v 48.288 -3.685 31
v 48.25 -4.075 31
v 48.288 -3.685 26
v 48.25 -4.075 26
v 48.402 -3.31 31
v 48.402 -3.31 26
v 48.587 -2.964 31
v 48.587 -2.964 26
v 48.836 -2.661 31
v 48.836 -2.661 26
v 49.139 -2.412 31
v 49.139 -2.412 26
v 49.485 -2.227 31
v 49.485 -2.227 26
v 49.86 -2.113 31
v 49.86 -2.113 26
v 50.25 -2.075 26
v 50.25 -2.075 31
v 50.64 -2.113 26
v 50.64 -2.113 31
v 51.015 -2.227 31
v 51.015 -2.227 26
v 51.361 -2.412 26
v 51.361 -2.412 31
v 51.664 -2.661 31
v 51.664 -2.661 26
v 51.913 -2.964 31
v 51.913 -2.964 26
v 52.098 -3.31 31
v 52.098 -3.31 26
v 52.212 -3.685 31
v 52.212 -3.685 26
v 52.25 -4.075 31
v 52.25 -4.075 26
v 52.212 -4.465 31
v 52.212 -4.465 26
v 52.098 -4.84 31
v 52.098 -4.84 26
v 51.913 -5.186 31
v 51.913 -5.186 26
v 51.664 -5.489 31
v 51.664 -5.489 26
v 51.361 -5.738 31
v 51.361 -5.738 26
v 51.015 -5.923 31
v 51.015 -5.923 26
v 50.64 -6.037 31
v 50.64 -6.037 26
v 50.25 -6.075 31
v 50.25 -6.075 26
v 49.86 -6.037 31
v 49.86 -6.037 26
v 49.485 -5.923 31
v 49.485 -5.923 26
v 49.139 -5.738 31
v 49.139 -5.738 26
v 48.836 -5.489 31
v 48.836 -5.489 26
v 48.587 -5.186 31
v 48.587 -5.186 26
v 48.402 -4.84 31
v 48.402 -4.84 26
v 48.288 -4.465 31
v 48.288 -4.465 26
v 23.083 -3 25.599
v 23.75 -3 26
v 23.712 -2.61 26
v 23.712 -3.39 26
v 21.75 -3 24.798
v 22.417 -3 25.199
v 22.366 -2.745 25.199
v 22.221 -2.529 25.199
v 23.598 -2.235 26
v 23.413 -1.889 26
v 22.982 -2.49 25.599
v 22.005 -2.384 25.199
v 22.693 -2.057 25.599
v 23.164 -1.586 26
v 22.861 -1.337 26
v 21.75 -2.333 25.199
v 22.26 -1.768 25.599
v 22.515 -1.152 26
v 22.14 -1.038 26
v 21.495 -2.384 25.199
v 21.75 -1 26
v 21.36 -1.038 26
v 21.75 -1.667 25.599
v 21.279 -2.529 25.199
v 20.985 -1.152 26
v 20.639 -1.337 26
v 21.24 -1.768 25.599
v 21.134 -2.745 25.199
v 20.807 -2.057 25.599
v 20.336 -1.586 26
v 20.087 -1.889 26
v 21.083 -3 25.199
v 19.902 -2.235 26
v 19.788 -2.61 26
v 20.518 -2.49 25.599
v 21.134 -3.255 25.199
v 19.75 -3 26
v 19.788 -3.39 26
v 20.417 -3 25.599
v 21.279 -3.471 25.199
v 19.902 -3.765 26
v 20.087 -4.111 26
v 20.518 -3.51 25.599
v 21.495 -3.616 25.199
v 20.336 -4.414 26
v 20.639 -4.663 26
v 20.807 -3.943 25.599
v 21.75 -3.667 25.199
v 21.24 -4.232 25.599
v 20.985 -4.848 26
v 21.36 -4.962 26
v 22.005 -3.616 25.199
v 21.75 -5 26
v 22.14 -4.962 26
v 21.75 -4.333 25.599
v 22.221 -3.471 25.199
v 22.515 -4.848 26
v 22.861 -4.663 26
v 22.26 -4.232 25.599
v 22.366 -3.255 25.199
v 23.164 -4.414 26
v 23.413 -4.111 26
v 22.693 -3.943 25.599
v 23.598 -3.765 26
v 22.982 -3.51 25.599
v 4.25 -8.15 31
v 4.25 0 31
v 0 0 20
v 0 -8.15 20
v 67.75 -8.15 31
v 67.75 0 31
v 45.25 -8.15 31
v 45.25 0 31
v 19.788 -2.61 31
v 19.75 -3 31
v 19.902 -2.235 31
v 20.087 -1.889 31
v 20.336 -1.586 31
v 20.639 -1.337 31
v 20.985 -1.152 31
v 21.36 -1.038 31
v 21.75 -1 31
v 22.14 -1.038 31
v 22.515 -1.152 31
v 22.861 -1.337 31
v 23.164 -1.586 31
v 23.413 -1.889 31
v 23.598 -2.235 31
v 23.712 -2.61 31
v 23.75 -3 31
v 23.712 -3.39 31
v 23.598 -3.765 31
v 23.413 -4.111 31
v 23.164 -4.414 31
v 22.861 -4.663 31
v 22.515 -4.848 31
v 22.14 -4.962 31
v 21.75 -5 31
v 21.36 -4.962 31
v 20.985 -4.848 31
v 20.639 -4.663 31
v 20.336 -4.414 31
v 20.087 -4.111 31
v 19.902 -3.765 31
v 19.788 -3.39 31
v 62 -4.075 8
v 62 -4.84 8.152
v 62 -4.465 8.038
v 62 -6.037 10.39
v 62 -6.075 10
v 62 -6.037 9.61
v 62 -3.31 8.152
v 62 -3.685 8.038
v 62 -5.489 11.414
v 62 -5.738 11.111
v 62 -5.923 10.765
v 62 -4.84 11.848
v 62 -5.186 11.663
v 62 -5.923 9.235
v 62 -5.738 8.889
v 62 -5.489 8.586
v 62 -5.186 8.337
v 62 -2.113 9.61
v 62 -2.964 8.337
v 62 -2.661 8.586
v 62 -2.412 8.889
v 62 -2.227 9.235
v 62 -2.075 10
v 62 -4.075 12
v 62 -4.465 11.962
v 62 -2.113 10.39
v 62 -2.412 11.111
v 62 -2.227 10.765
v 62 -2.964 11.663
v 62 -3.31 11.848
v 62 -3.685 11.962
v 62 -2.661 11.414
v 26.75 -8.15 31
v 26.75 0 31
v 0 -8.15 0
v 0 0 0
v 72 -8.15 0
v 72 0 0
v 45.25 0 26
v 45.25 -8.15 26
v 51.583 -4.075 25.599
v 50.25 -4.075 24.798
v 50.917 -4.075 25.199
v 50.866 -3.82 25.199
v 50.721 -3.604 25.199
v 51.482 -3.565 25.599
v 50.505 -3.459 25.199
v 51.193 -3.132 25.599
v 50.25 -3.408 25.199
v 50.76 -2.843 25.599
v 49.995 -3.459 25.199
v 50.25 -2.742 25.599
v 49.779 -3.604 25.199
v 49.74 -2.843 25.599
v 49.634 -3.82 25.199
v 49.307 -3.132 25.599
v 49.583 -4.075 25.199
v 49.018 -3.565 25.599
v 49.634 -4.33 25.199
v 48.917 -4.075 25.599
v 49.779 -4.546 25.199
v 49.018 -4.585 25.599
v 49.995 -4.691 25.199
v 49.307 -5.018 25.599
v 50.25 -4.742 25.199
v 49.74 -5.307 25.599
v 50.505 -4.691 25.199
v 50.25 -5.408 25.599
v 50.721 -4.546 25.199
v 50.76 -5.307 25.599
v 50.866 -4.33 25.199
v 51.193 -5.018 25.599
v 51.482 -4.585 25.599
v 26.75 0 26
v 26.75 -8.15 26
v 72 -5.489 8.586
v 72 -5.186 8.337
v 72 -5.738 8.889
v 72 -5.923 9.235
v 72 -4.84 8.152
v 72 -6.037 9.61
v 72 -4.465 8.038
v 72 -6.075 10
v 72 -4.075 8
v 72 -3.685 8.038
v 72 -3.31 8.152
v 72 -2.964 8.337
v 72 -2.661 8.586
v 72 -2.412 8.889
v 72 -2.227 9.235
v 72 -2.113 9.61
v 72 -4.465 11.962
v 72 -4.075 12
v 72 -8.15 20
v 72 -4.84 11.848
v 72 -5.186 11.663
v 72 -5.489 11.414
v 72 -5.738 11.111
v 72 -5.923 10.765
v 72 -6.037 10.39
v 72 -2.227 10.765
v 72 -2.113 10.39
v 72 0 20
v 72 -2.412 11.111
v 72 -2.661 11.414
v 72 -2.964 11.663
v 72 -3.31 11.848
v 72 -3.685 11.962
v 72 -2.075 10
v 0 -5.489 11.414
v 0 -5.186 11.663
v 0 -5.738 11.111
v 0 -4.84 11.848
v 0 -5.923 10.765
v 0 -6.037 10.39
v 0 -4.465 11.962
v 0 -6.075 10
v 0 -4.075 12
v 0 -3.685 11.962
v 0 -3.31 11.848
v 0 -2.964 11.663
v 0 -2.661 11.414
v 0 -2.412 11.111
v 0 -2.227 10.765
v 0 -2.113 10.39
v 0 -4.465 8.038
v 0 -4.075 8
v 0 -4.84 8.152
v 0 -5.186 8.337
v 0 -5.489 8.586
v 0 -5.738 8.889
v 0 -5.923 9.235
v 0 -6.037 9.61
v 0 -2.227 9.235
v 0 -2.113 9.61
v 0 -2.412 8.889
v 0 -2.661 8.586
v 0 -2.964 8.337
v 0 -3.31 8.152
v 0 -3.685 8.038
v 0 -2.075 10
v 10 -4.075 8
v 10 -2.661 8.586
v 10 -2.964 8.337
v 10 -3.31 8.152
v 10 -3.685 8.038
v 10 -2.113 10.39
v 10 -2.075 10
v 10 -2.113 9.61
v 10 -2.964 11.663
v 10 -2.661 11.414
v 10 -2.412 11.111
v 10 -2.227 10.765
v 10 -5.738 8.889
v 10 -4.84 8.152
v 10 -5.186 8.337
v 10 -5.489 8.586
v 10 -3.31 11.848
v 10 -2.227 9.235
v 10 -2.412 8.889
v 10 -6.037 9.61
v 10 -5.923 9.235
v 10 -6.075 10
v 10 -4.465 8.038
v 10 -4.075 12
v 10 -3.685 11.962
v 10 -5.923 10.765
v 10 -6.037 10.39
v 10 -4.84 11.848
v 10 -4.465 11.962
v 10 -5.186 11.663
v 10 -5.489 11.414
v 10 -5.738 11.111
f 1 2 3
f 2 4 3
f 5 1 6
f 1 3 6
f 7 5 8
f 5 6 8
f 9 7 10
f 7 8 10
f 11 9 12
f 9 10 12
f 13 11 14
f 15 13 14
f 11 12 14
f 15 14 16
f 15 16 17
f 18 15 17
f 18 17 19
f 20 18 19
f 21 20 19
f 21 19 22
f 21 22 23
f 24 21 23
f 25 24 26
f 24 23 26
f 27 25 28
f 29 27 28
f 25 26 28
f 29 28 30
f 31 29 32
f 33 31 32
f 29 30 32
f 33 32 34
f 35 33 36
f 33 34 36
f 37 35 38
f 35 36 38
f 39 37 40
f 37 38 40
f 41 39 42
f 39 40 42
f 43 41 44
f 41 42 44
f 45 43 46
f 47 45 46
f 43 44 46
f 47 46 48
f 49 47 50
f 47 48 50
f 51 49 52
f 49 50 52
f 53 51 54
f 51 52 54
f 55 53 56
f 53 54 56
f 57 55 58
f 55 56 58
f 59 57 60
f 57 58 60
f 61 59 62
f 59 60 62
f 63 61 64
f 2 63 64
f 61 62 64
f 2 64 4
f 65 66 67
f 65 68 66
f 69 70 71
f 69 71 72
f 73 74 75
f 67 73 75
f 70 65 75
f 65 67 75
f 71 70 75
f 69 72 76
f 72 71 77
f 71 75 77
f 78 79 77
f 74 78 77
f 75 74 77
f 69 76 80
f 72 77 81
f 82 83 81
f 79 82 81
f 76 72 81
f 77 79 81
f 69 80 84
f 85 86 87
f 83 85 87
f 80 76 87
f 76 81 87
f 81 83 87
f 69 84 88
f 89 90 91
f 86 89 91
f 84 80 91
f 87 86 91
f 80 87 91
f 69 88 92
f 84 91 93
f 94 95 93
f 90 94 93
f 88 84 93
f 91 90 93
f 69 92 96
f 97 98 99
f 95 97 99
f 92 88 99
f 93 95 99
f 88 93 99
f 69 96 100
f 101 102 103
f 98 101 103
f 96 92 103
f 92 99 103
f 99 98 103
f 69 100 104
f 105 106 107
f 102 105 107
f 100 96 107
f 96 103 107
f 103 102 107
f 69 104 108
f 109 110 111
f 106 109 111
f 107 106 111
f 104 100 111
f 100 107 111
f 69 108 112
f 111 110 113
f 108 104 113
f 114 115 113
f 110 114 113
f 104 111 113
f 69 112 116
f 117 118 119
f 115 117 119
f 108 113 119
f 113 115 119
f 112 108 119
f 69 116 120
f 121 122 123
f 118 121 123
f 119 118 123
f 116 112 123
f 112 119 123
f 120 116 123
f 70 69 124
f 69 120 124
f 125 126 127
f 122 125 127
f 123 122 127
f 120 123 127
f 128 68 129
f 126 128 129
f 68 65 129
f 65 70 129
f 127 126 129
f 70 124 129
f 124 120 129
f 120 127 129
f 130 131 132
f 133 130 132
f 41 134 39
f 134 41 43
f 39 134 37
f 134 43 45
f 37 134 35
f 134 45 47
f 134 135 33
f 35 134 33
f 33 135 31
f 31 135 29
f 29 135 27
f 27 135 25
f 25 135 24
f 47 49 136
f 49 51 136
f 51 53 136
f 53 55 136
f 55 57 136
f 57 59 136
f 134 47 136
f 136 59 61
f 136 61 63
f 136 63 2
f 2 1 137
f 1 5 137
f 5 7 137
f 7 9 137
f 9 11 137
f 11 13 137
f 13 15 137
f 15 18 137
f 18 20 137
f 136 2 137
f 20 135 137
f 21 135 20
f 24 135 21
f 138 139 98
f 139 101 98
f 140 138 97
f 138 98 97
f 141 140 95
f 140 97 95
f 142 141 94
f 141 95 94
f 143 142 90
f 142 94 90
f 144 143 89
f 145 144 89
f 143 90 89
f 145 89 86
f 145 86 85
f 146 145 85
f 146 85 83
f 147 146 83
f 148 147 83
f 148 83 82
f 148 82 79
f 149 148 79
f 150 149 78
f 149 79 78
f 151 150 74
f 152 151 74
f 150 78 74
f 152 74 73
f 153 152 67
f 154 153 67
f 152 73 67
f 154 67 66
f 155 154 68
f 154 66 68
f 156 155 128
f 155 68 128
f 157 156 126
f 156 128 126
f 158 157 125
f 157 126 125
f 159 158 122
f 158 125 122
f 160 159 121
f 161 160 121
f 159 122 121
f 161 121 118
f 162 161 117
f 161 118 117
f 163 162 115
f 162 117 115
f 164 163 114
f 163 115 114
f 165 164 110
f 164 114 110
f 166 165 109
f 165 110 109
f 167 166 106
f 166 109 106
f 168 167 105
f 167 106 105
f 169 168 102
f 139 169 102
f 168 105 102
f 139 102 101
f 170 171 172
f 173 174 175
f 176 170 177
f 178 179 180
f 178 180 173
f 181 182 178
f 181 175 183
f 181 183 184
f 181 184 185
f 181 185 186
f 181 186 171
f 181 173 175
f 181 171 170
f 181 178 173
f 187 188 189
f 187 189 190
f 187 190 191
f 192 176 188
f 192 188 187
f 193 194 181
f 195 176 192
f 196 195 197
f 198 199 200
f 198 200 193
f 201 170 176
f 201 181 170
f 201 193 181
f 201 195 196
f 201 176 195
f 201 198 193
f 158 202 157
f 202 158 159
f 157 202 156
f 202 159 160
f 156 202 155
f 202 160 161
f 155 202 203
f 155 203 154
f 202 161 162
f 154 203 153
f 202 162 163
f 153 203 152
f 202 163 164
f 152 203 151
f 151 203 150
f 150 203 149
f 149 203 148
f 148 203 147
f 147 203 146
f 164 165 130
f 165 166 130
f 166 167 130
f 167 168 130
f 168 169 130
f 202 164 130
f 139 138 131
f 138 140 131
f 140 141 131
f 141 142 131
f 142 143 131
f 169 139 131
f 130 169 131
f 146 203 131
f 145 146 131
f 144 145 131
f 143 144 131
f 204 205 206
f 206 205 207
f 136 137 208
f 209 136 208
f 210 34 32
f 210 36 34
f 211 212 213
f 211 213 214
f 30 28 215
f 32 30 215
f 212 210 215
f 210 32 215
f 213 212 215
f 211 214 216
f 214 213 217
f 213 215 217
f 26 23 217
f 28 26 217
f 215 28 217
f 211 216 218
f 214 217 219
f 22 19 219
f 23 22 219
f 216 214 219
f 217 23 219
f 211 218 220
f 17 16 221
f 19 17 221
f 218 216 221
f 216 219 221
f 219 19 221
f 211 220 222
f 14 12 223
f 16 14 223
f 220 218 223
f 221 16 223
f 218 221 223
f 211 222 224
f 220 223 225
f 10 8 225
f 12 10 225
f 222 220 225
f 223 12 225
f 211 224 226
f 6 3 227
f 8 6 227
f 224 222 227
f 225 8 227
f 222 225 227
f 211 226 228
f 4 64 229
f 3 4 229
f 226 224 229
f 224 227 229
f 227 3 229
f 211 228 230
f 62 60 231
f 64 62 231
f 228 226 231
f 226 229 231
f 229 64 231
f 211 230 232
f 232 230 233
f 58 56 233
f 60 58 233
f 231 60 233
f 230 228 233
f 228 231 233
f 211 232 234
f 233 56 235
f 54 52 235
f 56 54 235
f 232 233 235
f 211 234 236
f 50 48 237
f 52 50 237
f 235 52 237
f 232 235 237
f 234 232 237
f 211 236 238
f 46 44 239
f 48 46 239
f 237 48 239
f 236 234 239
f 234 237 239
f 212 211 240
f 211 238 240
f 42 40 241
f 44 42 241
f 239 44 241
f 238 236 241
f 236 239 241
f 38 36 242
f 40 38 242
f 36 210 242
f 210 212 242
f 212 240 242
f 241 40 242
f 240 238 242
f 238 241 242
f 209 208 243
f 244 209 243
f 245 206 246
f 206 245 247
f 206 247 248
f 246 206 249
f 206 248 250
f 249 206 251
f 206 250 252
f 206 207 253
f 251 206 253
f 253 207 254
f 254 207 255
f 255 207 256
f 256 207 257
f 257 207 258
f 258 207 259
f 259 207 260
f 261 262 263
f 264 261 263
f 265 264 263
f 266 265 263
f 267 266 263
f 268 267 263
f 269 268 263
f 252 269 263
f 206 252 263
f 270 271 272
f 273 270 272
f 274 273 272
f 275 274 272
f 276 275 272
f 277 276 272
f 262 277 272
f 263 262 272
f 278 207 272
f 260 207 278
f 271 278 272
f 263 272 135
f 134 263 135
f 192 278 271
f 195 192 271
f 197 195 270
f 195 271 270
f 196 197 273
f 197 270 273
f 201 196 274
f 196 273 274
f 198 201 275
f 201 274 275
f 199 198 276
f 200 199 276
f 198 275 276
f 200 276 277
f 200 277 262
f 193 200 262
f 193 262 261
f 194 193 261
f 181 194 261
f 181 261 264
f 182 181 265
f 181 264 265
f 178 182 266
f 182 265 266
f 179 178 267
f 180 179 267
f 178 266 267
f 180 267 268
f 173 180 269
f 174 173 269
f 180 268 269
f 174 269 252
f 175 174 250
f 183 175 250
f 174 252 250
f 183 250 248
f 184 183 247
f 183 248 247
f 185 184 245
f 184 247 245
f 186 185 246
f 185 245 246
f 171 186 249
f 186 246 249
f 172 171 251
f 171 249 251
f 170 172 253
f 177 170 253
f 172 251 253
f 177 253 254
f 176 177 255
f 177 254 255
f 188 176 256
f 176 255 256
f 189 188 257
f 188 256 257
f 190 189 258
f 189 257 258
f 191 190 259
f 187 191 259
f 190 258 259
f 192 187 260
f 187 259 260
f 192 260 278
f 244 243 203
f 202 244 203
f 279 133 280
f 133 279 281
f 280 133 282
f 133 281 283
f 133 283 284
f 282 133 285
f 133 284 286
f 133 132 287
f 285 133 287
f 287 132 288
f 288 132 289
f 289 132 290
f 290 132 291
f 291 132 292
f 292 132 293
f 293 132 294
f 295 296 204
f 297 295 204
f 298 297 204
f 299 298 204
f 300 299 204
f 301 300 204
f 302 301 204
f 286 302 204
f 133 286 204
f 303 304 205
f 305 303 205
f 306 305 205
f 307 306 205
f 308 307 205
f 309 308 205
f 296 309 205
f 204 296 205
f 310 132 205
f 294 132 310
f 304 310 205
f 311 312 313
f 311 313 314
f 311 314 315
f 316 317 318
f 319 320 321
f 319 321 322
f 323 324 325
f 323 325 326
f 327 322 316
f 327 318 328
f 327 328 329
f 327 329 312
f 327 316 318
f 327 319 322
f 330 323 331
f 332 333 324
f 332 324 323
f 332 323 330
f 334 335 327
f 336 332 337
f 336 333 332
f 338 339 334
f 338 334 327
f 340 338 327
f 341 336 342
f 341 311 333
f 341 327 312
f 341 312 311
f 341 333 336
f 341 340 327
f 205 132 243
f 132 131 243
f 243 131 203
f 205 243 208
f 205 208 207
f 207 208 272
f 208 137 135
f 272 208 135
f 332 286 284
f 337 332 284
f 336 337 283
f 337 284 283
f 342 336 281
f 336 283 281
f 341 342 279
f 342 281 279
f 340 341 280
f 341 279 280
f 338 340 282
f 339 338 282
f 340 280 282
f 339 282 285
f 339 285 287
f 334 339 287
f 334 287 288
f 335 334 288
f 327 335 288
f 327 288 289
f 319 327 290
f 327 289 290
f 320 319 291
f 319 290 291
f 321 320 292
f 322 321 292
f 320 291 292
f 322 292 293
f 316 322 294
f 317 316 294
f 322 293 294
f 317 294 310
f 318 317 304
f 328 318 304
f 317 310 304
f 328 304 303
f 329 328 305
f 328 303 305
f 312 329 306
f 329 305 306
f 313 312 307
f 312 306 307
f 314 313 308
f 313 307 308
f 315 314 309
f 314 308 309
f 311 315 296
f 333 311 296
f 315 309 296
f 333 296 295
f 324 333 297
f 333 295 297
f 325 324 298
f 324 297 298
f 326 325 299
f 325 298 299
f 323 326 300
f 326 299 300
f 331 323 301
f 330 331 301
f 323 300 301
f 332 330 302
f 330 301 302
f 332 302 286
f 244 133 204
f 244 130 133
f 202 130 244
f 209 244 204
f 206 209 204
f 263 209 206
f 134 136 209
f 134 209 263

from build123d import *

# Parameters (mm, degrees)
F1_DEPTH = 8.15
F3_D     = 4
F3_DEPTH = 5
F3_TIP   = 1.2017212381
F4_R     = 2
F5_DEPTH = 10
F6_R     = 2
F7_DEPTH = 10


with BuildPart() as f1:
    # F0 (on Front) → F1 (new body)
    with BuildSketch(Plane.XZ):
        Polygon((0, 20), (0, 0), (72, 0), (72, 20), (67.75, 31), (45.25, 31), (45.25, 26), (26.75, 26), (26.75, 31), (4.25, 31), align=None)
    extrude(amount=F1_DEPTH)

    # F3
    with Locations(Plane.XY.offset(31)):
        with Locations((21.75, -3), (50.25, -4.075)):
            Hole(F3_D / 2, depth=F3_DEPTH)
            with Locations((0, 0, -(F3_DEPTH + F3_TIP / 2))):  # 118° drill point
                Cone(0, F3_D / 2, F3_TIP, mode=Mode.SUBTRACT)

    # F4 (on face) → F5 (cut)
    with BuildSketch(Plane.YZ.offset(72)):
        with Locations((-4.075, 10)):
            Circle(F4_R)
    extrude(amount=-F5_DEPTH, mode=Mode.SUBTRACT)

    # F6 (on face) → F7 (cut)
    with BuildSketch(Plane(origin=(0, 0, 0), x_dir=(0, -1, 0), z_dir=(-1, 0, 0))):
        with Locations((4.075, 10)):
            Circle(F6_R)
    extrude(amount=-F7_DEPTH, mode=Mode.SUBTRACT)


solid = f1.part
